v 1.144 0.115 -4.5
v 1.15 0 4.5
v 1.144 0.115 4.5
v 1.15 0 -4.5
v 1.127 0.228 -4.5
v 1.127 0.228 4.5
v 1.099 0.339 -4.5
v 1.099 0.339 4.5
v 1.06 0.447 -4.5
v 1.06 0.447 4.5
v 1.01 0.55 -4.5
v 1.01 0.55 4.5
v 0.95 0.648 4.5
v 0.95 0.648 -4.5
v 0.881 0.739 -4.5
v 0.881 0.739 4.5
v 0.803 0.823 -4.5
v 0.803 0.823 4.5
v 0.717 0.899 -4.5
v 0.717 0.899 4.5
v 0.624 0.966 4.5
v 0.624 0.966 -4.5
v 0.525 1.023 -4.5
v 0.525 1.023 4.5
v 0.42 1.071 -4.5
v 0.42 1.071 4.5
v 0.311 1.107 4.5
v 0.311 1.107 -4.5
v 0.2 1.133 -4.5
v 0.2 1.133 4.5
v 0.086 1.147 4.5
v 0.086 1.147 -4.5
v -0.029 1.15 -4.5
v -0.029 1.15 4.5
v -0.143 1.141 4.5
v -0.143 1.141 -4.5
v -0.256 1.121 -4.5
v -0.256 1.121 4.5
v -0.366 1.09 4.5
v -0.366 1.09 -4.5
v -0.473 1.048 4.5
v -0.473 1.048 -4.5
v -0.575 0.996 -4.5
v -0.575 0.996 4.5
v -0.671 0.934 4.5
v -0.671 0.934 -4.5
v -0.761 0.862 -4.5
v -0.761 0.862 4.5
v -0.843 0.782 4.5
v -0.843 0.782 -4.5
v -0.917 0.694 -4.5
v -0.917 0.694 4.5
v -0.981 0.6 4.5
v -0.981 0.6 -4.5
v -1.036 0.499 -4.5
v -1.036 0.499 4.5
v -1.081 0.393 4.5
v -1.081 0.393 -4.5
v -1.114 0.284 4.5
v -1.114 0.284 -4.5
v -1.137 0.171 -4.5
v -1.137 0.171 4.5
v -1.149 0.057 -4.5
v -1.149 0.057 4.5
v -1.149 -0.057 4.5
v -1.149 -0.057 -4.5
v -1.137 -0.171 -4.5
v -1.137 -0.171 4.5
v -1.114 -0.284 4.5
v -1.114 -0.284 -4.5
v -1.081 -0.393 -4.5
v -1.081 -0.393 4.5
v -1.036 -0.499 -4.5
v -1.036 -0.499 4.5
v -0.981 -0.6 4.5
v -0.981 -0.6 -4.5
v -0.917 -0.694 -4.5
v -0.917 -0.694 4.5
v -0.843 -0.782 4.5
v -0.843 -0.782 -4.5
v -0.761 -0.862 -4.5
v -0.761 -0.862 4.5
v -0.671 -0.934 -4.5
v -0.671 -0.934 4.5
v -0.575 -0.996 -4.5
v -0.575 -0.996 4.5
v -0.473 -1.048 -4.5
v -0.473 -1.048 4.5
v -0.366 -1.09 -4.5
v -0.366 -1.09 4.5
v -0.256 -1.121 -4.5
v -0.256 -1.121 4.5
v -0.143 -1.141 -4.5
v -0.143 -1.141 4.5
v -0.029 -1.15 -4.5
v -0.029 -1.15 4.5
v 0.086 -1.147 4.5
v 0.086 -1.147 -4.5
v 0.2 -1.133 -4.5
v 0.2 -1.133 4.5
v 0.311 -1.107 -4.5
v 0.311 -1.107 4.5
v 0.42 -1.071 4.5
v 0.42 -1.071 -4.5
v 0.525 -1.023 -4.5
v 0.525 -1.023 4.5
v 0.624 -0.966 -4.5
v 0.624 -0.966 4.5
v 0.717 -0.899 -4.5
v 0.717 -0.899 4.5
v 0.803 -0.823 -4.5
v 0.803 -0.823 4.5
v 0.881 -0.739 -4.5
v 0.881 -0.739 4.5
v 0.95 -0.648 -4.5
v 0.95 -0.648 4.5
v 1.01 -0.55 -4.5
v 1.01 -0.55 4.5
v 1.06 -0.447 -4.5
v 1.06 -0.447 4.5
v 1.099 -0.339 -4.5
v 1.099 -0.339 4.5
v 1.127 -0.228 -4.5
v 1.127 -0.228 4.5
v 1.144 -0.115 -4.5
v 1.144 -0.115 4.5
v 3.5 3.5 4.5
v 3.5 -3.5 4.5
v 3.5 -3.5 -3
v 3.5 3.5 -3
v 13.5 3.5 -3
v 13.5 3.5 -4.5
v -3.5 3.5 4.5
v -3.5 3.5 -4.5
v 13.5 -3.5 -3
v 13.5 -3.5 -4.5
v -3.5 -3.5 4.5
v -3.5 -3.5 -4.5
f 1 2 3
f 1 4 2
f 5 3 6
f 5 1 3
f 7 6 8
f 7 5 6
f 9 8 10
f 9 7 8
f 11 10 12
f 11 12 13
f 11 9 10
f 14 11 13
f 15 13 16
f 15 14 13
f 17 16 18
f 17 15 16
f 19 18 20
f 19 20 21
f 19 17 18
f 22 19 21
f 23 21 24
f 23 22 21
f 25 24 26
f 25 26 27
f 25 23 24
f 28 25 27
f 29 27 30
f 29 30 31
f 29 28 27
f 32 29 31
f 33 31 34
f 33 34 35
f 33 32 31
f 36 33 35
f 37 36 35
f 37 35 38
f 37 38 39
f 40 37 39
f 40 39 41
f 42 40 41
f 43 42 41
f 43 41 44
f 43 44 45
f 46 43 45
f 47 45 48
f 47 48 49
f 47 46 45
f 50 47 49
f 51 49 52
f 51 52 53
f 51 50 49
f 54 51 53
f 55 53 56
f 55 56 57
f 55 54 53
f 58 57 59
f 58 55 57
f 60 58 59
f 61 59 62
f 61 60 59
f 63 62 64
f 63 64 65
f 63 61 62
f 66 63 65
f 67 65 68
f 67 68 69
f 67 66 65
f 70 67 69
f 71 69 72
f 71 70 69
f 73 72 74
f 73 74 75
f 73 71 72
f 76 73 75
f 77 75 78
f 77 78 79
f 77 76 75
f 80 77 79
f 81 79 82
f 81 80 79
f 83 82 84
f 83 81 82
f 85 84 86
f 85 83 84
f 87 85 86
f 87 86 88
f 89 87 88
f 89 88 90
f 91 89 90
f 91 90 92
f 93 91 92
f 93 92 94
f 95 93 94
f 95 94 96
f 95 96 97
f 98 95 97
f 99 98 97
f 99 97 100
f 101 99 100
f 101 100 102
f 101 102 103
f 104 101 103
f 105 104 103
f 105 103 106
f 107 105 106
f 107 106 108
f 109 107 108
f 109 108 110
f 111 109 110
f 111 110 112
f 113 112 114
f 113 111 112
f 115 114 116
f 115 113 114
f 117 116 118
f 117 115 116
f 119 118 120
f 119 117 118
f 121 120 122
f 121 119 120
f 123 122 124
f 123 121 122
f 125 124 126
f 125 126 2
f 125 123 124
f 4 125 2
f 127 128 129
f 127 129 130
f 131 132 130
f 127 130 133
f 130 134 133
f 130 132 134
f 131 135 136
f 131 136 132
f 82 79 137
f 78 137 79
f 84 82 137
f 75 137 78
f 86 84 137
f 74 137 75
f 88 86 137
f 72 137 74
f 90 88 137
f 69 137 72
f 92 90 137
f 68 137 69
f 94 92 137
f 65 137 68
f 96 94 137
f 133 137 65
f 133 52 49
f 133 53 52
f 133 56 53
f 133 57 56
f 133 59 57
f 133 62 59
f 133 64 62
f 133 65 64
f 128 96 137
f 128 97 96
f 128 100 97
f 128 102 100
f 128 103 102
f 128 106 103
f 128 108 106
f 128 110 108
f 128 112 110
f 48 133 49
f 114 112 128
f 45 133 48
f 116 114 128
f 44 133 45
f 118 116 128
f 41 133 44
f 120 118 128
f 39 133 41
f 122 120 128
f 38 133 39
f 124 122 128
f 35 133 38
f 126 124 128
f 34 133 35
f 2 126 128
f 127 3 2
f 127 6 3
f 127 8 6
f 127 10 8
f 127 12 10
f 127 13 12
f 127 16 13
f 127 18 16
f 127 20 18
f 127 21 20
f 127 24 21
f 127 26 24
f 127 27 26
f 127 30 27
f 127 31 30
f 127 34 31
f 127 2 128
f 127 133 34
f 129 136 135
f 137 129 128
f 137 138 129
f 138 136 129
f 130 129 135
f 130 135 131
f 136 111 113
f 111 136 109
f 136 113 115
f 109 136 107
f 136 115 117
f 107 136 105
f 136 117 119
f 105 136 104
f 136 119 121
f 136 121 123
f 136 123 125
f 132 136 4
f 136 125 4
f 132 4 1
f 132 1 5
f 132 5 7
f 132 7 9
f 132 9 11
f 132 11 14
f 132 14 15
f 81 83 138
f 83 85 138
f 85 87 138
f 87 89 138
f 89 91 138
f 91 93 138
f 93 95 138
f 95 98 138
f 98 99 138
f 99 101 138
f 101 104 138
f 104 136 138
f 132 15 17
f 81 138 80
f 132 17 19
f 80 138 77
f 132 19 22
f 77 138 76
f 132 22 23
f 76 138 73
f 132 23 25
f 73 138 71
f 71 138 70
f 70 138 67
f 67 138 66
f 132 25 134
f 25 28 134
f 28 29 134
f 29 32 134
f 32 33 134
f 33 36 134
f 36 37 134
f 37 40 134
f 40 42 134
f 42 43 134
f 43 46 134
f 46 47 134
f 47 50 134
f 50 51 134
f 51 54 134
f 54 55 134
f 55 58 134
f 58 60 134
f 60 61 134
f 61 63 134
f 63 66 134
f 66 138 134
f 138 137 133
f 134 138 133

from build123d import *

# Parameters (mm, degrees)
F0_W     = 7
F0_H     = 7
F0_R     = 1.15
F1_DEPTH = 4.5
F2_W     = 7
F2_H     = 1.5
F3_DEPTH = 10


with BuildPart() as f1:
    # F0 (on Top) → F1 (new body, symmetric)
    with BuildSketch(Plane.XY):
        Rectangle(F0_W, F0_H)
        Circle(F0_R, mode=Mode.SUBTRACT)
    extrude(amount=F1_DEPTH, both=True)

    # F2 (on face) → F3 (join)
    with BuildSketch(Plane.YZ.offset(3.5)):
        with Locations((0, -3.75)):
            Rectangle(F2_W, F2_H)
    extrude(amount=F3_DEPTH)


solid = f1.part
